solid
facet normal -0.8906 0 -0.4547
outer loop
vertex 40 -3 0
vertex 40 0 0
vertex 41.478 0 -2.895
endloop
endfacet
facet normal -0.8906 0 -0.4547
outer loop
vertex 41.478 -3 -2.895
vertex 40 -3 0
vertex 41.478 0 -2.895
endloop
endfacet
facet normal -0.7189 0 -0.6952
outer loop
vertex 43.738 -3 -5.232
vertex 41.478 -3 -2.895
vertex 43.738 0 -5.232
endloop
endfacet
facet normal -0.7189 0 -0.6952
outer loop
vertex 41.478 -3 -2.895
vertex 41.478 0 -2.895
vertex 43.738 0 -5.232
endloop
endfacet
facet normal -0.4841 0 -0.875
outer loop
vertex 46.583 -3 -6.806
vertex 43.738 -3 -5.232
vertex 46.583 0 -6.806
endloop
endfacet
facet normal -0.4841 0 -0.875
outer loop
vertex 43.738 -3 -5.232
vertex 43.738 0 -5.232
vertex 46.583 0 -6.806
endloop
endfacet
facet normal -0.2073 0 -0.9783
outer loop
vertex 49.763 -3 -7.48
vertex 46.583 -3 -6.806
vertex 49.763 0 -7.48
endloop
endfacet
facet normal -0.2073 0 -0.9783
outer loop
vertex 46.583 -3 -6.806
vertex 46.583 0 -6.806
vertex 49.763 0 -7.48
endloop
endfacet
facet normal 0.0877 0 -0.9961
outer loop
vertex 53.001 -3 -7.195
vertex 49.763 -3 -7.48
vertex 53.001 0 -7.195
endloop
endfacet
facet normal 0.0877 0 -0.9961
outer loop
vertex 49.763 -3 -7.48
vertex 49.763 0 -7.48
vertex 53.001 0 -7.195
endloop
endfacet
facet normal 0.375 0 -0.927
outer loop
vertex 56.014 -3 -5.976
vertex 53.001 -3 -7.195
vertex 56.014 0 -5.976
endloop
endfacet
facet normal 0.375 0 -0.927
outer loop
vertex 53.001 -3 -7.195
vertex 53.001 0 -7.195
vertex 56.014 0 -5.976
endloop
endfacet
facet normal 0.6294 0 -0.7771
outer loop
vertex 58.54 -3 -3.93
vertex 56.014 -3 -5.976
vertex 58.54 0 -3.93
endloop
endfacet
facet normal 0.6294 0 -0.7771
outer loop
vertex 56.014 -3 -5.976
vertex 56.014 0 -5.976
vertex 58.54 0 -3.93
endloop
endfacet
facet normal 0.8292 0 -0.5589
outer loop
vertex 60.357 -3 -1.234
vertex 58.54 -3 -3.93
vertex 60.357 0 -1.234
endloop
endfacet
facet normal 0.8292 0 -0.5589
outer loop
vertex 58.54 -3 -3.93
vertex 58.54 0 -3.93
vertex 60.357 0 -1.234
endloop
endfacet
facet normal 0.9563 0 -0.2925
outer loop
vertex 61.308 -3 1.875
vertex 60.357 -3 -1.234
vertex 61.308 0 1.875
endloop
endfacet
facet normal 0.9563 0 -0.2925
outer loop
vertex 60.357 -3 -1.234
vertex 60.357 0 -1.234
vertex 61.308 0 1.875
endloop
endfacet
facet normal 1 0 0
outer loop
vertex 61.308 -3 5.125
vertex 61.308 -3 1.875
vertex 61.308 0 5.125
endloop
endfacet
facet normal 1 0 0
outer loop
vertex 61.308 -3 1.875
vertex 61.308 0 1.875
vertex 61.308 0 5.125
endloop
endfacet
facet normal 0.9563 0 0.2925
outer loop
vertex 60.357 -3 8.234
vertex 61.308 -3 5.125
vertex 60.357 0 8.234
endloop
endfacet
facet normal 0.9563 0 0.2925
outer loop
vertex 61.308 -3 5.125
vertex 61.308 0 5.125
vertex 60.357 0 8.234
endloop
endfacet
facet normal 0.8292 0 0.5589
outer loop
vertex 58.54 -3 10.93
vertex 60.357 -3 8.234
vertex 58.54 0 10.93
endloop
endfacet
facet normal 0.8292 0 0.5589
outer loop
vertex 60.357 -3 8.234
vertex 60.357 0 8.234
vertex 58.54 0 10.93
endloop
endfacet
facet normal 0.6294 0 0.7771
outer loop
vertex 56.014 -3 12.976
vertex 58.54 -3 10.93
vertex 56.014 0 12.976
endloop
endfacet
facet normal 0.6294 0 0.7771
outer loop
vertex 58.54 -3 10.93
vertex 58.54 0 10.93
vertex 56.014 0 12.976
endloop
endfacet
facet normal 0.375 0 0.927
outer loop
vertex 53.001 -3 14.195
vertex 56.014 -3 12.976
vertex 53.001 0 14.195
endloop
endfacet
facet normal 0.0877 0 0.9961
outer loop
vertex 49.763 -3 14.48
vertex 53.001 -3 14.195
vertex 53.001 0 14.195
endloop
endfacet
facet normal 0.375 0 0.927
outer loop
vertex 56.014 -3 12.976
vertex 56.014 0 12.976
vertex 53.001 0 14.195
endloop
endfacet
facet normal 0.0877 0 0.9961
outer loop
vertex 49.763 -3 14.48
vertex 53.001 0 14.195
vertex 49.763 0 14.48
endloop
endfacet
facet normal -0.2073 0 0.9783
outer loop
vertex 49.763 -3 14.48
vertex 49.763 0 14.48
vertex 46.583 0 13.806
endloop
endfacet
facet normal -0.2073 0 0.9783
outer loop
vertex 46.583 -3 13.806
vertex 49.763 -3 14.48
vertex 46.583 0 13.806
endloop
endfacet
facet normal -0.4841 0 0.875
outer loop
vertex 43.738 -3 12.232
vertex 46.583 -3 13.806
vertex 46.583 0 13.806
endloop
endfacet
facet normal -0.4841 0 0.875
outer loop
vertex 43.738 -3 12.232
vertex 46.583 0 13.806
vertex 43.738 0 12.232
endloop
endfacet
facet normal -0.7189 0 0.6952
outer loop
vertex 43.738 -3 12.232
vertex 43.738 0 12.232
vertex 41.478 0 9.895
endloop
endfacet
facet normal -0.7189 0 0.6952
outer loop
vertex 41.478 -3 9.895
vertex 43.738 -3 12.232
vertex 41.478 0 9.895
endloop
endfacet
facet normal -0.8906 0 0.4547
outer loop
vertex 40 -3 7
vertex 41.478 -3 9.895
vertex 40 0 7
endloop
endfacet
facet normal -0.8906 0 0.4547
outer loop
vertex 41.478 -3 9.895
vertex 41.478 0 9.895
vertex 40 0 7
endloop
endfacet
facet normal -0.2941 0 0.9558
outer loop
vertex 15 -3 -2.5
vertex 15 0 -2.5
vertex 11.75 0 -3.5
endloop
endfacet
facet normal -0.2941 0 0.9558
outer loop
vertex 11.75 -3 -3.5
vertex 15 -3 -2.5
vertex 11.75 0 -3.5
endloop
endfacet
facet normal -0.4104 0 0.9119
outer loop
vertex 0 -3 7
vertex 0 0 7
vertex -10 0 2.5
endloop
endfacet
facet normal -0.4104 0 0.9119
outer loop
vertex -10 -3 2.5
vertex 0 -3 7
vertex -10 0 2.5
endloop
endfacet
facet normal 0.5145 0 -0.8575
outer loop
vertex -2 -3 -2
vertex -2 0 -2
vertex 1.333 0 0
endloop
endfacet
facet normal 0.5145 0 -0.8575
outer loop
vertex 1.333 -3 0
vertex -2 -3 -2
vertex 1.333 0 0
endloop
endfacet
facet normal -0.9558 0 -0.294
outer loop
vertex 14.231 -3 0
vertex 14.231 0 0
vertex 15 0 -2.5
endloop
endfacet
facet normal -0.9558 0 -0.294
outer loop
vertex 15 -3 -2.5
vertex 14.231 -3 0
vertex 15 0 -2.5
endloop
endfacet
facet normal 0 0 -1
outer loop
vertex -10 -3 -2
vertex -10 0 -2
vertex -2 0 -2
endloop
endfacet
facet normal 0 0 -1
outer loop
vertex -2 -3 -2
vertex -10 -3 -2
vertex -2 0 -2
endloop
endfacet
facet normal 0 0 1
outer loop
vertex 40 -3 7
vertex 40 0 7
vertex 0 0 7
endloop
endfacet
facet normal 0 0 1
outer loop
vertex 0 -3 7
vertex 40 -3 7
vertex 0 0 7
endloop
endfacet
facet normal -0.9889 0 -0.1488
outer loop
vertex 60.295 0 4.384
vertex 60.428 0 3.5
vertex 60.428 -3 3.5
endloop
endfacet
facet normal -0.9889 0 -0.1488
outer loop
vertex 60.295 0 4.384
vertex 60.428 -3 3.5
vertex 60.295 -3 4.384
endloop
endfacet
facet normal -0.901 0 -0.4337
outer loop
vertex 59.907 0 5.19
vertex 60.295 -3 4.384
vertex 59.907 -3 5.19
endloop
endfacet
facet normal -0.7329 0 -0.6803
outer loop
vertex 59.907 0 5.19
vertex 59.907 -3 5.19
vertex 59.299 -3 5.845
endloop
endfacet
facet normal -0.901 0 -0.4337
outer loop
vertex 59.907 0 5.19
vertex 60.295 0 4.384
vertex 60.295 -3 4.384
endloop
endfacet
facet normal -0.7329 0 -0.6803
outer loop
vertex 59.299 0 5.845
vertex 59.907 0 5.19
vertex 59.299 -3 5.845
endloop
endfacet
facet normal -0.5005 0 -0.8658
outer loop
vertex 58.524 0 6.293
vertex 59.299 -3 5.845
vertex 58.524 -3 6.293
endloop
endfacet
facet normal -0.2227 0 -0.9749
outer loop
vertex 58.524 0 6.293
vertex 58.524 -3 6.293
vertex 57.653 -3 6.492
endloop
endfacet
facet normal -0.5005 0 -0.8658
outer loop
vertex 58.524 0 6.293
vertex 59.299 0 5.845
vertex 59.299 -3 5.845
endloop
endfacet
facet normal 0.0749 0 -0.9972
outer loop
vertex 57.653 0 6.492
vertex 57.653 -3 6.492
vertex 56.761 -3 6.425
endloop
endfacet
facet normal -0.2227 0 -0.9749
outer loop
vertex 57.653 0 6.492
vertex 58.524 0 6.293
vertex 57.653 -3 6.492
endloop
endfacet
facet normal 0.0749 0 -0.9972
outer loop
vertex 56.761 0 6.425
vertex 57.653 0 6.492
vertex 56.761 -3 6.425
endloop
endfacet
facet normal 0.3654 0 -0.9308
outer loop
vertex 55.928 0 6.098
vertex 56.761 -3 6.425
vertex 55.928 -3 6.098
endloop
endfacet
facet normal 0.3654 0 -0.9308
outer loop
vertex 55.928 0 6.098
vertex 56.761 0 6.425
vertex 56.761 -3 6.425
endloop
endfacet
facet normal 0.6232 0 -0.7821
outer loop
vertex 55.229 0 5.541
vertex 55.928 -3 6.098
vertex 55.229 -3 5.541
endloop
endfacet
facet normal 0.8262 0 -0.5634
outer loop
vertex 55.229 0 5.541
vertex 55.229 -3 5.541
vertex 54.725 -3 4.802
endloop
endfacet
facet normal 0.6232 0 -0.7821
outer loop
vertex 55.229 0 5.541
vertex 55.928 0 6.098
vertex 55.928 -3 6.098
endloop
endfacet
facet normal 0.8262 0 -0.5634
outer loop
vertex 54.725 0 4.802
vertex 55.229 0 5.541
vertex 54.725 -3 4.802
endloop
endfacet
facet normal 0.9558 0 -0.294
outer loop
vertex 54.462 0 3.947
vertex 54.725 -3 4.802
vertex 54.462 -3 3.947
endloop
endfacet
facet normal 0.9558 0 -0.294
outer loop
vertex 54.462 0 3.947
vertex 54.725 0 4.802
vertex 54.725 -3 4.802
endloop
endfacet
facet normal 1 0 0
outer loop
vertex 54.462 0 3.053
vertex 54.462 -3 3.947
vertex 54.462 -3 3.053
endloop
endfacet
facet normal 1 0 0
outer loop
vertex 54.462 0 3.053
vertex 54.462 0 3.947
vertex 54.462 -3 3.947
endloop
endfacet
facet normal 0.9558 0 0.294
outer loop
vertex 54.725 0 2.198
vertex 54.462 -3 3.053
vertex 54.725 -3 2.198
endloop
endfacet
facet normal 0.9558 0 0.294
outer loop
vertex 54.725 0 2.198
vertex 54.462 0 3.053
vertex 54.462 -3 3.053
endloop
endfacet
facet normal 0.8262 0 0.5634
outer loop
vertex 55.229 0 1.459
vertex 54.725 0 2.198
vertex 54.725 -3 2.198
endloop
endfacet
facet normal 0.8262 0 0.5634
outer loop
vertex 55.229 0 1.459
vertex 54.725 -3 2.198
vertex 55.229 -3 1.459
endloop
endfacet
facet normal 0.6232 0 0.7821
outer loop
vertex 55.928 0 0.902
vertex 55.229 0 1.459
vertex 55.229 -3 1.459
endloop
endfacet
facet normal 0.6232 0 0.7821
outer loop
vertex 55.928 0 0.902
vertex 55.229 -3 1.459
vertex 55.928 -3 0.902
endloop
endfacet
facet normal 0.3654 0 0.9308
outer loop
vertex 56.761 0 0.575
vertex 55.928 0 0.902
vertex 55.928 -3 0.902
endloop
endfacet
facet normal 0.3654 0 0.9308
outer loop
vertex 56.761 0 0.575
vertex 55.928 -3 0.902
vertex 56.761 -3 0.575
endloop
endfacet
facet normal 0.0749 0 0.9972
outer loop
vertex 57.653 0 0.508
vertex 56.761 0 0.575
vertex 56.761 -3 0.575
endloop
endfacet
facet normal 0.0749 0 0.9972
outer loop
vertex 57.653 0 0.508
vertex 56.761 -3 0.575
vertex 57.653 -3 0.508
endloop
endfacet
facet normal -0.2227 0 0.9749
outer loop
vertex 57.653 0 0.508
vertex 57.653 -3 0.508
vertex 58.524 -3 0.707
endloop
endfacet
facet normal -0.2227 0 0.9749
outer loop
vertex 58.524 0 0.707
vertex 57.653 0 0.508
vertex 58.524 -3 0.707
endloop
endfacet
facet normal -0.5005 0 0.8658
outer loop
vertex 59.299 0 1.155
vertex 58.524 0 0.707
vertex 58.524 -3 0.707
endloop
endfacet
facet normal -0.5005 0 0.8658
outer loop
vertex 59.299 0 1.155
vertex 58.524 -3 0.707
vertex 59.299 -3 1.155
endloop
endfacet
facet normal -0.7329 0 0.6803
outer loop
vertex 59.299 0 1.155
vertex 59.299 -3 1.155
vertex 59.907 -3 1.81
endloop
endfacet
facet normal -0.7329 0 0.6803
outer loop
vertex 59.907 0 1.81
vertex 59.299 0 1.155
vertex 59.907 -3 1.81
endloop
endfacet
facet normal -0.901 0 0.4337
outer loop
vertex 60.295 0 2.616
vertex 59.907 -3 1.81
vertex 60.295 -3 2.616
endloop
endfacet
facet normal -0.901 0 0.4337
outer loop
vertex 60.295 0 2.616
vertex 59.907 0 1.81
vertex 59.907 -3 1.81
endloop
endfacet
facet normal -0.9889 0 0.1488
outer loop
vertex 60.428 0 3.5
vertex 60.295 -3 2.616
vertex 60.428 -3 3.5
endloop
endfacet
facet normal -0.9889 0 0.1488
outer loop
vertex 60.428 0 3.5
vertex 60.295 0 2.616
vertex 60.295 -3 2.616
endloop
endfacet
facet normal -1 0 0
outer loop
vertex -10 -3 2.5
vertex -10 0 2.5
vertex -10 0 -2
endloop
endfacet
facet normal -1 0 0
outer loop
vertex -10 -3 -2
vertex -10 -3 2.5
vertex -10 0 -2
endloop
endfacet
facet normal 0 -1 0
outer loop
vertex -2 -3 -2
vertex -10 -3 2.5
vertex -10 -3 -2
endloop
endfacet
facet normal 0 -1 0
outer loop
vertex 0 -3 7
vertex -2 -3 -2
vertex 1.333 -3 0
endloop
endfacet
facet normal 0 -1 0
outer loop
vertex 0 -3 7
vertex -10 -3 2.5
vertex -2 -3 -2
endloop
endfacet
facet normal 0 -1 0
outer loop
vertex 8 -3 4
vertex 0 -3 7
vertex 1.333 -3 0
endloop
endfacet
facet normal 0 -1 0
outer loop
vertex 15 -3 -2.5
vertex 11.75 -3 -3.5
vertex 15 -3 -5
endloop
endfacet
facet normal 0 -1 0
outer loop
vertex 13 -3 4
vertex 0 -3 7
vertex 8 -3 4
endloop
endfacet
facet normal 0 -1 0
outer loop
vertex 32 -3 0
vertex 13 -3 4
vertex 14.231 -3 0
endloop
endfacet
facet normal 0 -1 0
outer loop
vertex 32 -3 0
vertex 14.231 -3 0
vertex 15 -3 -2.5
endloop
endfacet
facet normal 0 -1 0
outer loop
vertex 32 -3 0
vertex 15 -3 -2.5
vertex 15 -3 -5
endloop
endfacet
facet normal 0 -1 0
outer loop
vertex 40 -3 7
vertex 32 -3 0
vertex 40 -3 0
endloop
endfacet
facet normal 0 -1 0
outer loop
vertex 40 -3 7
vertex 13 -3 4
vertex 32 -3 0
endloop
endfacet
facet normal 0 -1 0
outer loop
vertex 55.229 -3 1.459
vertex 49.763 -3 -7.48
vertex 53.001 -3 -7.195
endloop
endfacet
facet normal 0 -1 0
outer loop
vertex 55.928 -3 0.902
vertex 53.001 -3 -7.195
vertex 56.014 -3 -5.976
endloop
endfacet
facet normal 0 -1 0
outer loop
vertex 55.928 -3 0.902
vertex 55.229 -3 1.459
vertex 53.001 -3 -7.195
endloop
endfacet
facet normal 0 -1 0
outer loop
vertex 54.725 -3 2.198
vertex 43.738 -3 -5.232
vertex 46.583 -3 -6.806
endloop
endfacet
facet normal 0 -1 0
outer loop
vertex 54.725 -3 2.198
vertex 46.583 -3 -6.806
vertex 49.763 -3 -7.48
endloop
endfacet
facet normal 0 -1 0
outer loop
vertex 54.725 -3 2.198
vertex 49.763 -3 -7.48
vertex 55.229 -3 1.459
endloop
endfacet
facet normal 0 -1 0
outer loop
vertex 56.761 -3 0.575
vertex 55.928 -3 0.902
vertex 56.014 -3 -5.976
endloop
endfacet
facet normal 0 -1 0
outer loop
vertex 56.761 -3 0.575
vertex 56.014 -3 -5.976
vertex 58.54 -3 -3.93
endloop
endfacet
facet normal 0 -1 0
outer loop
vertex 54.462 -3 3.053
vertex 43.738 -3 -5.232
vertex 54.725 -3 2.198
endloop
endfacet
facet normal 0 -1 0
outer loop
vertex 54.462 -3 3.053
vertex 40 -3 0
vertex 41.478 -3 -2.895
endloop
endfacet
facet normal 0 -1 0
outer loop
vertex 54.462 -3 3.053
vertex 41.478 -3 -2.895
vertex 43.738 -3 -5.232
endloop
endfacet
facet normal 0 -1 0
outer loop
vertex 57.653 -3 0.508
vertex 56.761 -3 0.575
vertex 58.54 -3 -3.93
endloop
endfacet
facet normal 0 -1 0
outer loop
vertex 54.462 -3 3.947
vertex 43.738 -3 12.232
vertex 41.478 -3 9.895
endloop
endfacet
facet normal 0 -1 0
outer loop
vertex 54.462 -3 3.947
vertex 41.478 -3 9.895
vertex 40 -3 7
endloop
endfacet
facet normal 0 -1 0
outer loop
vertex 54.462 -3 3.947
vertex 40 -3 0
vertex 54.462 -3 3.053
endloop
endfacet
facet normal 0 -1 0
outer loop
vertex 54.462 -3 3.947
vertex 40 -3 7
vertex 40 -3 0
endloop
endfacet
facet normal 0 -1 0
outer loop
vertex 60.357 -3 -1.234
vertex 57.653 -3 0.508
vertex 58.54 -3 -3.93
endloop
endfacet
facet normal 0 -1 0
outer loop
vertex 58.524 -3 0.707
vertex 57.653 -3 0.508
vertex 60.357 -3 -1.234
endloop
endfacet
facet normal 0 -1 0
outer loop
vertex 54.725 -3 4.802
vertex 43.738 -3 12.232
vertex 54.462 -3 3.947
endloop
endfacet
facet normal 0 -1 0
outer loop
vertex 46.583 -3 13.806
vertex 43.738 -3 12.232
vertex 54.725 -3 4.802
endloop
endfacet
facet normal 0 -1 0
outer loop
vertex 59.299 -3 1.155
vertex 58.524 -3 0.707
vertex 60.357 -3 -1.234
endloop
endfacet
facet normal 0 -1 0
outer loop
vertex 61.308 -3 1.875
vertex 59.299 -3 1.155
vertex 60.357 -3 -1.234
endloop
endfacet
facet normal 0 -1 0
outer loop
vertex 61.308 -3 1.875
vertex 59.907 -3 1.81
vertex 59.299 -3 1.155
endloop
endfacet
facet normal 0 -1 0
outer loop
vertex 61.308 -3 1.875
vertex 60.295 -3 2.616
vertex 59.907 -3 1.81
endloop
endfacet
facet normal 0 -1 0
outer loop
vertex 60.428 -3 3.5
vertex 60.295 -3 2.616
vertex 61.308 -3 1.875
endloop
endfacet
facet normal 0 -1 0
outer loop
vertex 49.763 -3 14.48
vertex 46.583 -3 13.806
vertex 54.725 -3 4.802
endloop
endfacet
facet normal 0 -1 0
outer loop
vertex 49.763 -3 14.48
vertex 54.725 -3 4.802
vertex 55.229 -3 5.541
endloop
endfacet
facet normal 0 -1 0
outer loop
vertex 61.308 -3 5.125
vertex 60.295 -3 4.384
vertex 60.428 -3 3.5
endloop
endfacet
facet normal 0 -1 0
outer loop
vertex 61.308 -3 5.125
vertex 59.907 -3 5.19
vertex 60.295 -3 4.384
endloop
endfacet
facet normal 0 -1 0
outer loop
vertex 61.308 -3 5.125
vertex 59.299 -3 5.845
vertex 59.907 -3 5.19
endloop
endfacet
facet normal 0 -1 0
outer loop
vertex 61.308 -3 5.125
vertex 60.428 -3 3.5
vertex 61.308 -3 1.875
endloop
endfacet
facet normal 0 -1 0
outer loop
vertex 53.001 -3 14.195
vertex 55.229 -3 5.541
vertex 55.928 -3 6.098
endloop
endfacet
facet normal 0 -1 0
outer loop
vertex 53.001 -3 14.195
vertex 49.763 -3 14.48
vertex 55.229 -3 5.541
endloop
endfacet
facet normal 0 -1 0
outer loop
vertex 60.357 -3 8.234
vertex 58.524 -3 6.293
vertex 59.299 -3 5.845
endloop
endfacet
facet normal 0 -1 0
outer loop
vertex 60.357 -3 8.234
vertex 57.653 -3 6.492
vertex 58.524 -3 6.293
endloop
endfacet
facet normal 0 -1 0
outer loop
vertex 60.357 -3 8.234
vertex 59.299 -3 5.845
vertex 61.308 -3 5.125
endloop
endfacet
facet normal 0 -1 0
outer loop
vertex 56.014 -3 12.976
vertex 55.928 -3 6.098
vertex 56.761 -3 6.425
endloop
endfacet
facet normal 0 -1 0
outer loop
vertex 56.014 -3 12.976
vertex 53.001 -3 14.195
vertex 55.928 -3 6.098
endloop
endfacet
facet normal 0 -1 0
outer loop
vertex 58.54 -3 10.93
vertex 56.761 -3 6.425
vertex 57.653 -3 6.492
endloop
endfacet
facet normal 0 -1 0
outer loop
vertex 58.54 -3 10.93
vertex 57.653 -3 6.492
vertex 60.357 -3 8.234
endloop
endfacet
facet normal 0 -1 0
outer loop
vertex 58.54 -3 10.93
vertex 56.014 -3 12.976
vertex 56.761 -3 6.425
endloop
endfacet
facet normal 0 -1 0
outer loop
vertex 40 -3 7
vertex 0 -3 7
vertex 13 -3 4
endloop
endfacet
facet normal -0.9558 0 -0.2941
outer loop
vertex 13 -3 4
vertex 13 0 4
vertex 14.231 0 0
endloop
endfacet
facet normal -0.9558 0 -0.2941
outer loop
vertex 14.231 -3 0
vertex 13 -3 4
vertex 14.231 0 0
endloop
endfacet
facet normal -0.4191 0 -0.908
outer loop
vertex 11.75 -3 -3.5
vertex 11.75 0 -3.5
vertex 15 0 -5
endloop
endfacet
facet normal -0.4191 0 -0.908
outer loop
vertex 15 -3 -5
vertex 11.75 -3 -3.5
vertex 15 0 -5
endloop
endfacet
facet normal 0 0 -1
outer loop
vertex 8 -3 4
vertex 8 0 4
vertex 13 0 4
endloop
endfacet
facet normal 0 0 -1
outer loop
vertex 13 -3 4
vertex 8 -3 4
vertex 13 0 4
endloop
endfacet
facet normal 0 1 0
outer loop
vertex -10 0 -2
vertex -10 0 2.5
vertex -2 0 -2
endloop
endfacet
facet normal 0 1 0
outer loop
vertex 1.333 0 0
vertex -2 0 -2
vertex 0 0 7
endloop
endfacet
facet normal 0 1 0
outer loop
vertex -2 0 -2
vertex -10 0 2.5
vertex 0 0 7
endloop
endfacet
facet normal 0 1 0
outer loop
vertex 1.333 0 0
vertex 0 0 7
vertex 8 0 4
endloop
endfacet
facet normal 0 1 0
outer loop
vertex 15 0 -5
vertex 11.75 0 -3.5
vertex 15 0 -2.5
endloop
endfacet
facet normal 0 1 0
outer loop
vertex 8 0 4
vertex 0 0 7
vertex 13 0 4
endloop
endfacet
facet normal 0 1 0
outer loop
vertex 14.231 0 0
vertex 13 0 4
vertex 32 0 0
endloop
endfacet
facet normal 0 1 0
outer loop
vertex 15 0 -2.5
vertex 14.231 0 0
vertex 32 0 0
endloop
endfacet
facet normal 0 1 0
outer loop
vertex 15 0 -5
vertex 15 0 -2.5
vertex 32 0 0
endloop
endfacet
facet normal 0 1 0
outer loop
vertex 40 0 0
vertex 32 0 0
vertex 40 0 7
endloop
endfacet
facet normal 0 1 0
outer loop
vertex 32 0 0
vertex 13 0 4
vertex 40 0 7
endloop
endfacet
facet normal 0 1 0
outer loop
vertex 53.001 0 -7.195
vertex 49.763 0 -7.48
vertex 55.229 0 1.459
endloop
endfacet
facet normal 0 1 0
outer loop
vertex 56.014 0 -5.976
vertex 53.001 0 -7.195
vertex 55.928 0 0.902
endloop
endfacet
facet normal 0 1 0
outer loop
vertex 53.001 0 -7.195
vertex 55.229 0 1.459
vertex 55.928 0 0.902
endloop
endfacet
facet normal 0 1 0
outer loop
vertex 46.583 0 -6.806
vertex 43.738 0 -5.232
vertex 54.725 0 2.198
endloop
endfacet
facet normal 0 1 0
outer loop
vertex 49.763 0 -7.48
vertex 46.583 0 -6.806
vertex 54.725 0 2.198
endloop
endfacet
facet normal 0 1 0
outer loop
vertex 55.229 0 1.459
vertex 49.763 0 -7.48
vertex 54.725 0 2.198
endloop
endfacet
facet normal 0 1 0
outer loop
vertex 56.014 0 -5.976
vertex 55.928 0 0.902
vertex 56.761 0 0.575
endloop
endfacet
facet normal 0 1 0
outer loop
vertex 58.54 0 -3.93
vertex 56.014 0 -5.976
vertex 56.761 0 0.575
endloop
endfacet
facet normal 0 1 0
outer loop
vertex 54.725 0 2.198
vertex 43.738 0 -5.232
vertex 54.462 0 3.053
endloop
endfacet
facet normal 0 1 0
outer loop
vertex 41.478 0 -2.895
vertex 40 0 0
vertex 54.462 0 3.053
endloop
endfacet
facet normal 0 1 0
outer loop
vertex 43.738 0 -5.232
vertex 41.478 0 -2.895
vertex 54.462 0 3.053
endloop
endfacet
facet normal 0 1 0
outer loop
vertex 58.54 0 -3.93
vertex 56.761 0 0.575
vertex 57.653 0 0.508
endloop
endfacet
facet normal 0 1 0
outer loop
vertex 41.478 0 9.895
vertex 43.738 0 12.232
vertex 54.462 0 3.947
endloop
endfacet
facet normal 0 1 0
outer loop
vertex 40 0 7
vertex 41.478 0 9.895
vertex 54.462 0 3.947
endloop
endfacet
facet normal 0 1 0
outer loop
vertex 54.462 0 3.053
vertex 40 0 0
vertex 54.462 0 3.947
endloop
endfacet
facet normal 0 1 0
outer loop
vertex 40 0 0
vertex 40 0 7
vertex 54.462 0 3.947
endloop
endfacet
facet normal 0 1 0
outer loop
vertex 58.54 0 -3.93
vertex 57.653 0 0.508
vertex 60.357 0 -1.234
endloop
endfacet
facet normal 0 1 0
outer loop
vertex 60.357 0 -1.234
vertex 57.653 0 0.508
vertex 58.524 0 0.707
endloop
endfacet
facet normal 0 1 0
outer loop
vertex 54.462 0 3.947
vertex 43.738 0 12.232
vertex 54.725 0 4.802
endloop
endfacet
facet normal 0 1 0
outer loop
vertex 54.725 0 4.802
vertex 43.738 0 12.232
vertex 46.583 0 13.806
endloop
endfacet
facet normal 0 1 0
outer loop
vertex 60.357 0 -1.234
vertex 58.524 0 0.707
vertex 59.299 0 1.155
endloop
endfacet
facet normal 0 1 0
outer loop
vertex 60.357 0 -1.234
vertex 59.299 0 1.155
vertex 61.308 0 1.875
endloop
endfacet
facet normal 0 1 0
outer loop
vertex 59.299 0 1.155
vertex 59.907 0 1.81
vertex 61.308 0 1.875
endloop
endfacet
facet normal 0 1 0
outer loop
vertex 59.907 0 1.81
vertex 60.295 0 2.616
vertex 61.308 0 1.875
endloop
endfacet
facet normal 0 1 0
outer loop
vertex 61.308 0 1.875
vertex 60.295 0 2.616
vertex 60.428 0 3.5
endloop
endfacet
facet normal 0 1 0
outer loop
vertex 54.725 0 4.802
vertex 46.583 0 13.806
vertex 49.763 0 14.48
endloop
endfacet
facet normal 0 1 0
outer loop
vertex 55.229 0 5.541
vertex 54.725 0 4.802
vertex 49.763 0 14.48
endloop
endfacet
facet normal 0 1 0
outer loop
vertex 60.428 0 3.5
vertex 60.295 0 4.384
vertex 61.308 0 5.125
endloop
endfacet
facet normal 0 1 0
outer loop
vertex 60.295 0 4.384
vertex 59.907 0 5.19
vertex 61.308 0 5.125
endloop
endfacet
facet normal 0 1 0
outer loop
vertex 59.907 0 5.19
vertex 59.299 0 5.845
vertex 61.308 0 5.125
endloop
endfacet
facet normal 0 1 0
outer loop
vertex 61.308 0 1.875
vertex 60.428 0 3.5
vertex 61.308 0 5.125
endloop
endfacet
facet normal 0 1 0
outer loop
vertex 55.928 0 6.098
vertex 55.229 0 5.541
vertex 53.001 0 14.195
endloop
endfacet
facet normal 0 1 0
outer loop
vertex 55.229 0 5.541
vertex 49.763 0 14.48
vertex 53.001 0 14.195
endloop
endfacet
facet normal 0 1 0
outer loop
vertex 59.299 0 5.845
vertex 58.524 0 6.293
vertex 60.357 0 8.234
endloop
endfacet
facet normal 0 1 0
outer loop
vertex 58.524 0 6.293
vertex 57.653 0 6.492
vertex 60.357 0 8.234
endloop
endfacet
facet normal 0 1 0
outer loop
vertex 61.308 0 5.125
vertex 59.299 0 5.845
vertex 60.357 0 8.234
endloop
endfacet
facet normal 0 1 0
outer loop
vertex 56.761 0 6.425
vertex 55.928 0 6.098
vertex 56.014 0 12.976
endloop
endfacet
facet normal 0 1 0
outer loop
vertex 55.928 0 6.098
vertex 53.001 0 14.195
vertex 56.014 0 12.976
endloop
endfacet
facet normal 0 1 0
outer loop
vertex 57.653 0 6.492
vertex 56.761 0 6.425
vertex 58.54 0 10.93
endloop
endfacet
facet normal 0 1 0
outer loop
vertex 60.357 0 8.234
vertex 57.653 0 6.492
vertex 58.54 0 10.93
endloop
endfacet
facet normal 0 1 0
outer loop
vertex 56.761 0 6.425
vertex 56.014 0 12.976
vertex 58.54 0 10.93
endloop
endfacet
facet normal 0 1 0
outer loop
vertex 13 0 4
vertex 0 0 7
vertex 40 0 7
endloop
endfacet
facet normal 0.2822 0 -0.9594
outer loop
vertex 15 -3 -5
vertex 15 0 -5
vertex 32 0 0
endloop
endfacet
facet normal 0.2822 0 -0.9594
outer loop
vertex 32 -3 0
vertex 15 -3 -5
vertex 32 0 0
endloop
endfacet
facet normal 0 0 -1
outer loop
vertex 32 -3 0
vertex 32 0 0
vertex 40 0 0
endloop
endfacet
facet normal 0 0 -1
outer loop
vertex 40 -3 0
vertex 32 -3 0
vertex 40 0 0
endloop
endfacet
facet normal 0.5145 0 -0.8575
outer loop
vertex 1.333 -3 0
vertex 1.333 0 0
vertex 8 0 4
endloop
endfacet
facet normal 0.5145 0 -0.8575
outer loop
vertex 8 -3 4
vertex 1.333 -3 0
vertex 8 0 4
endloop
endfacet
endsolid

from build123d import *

# Parameters (mm, degrees)
F0_R     = 3
F1_DEPTH = 3


# Not quite as in the source:
# - a feature names something its author has since deleted; it is built from what else it names


with BuildPart() as f1:
    # F0 (on Front) → F1 (new body)
    with BuildSketch(Plane.XZ):
        Polygon((-2, -2), (1.3333333333, 0), (0, 0), (0, 7), (-10, 2.5), (-10, -2), align=None)
        Polygon((14.2307692308, 0), (32, 0), (40, 0), (40, 7), (0, 7), (0, 0), (1.3333333333, 0), (8, 4), (13, 4), align=None)
        Polygon((15, -5), (32, 0), (14.2307692308, 0), (15, -2.5), (11.75, -3.5), align=None)
        with BuildLine():
            Line((40, 7), (40, 0))
            ThreePointArc((40, 0), (61.4283268073, 3.5), (40, 7))
        make_face()
        with Locations((57.4283268073, 3.5)):
            Circle(F0_R, mode=Mode.SUBTRACT)
    extrude(amount=F1_DEPTH)


solid = f1.part
